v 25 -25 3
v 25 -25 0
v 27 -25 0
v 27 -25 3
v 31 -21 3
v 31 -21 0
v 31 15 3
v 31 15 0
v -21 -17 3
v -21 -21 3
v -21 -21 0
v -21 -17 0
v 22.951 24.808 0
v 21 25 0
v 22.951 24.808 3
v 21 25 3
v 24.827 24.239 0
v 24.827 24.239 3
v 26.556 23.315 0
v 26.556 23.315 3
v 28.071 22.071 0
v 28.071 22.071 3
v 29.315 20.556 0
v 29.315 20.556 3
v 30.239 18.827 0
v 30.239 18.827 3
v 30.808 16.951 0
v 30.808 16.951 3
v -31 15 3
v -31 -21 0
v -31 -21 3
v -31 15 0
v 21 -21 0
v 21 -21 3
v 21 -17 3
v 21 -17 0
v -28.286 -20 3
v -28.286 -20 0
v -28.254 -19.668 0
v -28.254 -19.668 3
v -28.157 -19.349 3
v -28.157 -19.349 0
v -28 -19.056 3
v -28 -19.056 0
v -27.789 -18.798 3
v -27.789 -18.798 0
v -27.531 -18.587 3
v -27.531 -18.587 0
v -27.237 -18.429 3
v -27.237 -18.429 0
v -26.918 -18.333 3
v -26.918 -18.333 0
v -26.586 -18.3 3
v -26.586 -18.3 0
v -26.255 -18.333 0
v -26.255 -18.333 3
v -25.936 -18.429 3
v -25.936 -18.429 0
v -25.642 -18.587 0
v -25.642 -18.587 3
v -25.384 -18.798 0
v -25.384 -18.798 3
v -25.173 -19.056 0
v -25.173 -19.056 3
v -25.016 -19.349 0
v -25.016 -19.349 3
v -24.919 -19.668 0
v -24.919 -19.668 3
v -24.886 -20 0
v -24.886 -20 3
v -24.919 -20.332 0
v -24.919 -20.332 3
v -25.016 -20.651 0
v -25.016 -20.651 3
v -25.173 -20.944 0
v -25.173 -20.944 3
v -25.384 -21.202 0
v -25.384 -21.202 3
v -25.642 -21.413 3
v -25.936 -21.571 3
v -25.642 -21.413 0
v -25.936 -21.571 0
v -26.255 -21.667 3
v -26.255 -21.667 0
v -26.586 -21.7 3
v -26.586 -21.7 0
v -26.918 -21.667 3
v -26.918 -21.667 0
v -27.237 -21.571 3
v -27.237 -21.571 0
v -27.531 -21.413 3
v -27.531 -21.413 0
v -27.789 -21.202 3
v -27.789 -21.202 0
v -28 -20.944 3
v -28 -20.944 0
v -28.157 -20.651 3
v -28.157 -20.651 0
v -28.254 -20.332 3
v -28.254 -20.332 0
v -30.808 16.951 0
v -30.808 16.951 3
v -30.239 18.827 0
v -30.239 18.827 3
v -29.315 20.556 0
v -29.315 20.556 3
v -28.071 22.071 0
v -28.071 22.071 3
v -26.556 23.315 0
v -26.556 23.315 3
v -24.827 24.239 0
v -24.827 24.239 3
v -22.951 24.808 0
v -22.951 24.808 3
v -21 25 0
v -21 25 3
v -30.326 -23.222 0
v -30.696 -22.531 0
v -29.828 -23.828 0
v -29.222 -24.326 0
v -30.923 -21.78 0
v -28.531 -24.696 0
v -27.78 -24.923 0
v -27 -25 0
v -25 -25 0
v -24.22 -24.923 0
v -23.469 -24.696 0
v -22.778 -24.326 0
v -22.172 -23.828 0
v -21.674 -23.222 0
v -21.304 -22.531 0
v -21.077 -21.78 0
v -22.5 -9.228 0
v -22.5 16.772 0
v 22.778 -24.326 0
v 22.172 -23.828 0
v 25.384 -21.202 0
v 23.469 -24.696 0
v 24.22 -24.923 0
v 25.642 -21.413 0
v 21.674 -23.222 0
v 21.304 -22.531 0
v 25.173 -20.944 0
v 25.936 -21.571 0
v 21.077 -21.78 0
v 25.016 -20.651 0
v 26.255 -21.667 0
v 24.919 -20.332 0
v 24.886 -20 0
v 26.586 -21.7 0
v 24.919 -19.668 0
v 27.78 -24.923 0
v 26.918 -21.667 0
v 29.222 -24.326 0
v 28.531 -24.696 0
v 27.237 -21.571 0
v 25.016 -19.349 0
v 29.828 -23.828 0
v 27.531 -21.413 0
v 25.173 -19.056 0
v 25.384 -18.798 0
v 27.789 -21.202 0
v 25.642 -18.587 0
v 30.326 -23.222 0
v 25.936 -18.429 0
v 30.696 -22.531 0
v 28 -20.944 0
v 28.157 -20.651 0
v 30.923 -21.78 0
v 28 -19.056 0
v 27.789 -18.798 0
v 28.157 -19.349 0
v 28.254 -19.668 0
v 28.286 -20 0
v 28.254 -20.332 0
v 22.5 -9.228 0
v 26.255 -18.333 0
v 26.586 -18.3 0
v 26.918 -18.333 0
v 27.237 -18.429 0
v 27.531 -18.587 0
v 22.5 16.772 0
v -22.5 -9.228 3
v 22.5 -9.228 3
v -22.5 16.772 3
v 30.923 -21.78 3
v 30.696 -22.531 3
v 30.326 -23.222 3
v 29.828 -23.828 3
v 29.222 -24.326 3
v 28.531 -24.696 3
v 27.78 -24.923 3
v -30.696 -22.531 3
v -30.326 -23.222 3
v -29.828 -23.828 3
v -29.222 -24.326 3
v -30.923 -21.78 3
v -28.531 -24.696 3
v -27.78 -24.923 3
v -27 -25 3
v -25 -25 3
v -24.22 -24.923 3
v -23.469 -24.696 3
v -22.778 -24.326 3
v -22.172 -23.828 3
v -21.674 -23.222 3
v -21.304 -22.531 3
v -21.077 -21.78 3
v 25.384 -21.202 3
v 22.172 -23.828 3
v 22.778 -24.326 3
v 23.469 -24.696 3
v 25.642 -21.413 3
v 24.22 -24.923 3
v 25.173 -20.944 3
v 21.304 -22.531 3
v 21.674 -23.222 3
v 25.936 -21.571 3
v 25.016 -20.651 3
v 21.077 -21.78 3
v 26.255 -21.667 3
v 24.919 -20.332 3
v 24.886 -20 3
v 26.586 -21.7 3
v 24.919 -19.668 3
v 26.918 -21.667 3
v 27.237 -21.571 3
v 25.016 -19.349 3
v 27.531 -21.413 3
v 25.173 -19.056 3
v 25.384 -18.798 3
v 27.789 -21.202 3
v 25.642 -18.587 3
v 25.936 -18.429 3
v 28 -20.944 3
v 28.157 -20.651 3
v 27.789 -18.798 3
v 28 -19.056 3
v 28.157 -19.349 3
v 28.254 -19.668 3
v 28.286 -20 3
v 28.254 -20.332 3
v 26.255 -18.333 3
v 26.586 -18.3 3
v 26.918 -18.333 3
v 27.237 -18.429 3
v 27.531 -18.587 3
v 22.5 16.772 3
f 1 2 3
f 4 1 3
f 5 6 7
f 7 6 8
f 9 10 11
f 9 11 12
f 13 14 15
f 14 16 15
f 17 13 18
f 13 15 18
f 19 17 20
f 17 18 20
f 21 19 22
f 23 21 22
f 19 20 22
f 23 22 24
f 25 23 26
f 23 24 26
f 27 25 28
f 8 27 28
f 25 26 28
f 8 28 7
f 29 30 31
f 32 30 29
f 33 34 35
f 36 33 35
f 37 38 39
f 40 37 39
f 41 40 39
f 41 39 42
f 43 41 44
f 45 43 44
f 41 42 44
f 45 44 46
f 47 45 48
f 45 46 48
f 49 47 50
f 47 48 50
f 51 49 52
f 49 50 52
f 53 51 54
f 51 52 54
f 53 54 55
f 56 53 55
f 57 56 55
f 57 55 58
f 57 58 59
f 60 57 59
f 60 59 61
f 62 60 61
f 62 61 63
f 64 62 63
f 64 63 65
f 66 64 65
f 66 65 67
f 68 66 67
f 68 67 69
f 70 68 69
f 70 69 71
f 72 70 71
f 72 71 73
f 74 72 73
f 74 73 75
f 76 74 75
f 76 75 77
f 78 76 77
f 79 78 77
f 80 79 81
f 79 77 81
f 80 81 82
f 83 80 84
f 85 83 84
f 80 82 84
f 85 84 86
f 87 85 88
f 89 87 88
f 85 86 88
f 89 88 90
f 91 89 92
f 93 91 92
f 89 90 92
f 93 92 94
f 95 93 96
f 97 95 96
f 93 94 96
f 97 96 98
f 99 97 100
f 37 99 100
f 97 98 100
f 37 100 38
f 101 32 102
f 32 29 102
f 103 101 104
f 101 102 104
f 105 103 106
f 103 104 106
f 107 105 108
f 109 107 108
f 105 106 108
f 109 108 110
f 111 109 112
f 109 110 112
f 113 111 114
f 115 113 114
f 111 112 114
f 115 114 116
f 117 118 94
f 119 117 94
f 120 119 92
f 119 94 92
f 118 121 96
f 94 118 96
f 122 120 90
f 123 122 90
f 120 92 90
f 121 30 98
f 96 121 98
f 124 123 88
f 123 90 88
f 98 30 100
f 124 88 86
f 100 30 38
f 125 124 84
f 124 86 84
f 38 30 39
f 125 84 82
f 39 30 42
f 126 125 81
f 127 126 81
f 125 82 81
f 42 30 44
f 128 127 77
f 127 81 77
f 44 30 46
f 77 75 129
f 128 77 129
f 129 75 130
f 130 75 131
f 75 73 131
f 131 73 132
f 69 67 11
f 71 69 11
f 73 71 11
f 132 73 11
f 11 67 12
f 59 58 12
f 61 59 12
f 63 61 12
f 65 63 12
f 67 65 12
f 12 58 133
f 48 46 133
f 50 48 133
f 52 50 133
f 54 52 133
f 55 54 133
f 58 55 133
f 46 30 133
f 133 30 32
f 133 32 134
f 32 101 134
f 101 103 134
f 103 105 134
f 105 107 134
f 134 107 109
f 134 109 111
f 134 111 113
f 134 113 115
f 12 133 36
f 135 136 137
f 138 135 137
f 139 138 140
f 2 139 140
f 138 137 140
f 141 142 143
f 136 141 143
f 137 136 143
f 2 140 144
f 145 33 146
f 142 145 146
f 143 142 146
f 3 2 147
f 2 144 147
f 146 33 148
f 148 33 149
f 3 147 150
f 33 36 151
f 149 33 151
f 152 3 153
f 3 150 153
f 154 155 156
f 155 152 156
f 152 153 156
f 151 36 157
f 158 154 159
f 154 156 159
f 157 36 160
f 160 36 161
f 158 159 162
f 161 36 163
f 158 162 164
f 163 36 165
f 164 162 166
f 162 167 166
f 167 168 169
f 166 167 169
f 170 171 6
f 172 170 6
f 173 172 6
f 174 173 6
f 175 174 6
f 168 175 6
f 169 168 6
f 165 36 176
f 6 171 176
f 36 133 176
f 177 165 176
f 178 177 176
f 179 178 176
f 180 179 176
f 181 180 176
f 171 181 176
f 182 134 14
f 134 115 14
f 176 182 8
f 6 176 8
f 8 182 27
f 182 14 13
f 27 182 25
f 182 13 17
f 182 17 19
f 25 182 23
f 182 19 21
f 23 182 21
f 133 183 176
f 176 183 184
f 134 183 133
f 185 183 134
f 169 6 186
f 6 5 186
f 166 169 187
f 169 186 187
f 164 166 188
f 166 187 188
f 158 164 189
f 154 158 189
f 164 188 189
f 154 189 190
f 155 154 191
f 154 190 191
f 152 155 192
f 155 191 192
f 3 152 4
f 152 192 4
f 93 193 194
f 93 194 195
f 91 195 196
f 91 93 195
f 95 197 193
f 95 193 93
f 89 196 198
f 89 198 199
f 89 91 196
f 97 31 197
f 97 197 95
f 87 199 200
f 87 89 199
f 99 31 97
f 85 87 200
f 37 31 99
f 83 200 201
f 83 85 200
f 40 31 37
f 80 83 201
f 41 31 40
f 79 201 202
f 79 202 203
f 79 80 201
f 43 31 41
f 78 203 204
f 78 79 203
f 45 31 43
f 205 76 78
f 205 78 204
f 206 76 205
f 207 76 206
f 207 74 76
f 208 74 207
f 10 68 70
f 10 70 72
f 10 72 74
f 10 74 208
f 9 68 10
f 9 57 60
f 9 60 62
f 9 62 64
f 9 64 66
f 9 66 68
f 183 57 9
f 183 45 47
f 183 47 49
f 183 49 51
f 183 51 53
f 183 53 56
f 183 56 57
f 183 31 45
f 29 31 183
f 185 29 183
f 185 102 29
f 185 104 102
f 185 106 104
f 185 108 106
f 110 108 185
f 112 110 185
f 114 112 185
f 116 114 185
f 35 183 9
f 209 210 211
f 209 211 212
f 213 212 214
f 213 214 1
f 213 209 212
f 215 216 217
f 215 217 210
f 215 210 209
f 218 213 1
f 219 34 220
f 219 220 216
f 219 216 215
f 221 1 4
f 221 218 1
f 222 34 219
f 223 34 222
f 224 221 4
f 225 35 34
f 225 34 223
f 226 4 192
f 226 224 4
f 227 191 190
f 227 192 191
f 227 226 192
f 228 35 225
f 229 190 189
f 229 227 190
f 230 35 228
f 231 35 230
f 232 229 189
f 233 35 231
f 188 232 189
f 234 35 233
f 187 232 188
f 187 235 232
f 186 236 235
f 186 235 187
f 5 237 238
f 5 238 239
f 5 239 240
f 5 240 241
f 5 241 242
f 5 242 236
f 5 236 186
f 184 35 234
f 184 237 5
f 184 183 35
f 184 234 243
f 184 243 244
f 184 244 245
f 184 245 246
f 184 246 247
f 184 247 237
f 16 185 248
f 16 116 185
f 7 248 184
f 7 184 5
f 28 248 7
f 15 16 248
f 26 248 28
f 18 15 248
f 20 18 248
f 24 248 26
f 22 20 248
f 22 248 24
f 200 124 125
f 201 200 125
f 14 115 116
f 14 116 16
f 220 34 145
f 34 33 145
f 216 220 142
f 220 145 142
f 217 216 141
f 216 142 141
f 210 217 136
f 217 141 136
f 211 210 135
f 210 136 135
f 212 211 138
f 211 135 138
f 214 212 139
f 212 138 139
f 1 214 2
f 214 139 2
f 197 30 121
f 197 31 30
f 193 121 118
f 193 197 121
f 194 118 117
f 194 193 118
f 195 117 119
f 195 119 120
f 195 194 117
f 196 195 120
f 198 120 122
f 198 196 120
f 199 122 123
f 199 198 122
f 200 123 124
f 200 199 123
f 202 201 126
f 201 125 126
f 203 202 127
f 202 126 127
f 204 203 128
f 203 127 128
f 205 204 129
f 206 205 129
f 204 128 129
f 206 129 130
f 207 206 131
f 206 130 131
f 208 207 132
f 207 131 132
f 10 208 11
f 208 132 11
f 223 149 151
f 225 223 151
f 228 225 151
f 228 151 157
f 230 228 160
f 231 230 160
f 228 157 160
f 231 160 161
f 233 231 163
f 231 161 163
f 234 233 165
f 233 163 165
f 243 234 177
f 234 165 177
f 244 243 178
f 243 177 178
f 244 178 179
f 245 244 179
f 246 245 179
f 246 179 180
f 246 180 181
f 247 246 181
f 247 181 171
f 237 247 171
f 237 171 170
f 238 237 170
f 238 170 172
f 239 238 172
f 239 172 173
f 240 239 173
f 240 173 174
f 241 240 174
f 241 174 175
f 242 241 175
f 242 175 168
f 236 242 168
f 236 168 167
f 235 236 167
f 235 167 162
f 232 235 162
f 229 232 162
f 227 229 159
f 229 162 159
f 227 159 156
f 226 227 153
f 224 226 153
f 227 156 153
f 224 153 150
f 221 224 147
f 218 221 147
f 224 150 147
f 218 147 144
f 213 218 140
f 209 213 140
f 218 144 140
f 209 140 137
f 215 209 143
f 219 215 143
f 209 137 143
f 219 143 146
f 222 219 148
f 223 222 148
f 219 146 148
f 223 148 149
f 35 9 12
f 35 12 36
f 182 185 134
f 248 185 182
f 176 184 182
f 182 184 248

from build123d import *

# Parameters (mm, degrees)
SCHIZZO2_W                   = 62
SCHIZZO2_H                   = 50
ESTRUSIONE_ESTRUSIONE1_DEPTH = 3
FORO_PER_VITE_M3_1_D         = 3.4
SCHIZZO5_W                   = 42
SCHIZZO5_H                   = 8
TAGLIO_ESTRUSIONE1_DEPTH     = 3
SCHIZZO6_W                   = 45
SCHIZZO6_H                   = 26
TAGLIO_ESTRUSIONE2_DEPTH     = 3
RACCORDO1_R                  = 10
RACCORDO2_R                  = 4


with BuildPart() as part:
    # Schizzo2 → Estrusione-Estrusione1 (new body)
    with BuildSketch(Plane.XY):
        Rectangle(SCHIZZO2_W, SCHIZZO2_H)
    extrude(amount=ESTRUSIONE_ESTRUSIONE1_DEPTH)

    # Foro per Vite M3-1 (through all)
    with Locations(Plane.XY.offset(3)):
        with Locations((-26.586432577, -20), (26.586432577, -20)):
            Hole(FORO_PER_VITE_M3_1_D / 2)

    # Schizzo5 → Taglio-Estrusione1 (cut)
    with BuildSketch(Plane.XY.offset(3)):
        with Locations((0, -21)):
            Rectangle(SCHIZZO5_W, SCHIZZO5_H)
    extrude(amount=-TAGLIO_ESTRUSIONE1_DEPTH, mode=Mode.SUBTRACT)

    # Schizzo6 → Taglio-Estrusione2 (cut)
    with BuildSketch(Plane.XY.offset(3)):
        with Locations((0, 3.772071737)):
            Rectangle(SCHIZZO6_W, SCHIZZO6_H)
    extrude(amount=-TAGLIO_ESTRUSIONE2_DEPTH, mode=Mode.SUBTRACT)

    # Raccordo1
    raccordo1_edges = [part.edges().sort_by_distance(p)[0] for p in [
        (-31, 25, 1.5),
        (31, 25, 1.5),
    ]]
    fillet(raccordo1_edges, radius=RACCORDO1_R)

    # Raccordo2
    raccordo2_edges = [part.edges().sort_by_distance(p)[0] for p in [
        (-21, -25, 1.5),
        (21, -25, 1.5),
        (31, -25, 1.5),
        (-31, -25, 1.5),
    ]]
    fillet(raccordo2_edges, radius=RACCORDO2_R)


solid = part.part
